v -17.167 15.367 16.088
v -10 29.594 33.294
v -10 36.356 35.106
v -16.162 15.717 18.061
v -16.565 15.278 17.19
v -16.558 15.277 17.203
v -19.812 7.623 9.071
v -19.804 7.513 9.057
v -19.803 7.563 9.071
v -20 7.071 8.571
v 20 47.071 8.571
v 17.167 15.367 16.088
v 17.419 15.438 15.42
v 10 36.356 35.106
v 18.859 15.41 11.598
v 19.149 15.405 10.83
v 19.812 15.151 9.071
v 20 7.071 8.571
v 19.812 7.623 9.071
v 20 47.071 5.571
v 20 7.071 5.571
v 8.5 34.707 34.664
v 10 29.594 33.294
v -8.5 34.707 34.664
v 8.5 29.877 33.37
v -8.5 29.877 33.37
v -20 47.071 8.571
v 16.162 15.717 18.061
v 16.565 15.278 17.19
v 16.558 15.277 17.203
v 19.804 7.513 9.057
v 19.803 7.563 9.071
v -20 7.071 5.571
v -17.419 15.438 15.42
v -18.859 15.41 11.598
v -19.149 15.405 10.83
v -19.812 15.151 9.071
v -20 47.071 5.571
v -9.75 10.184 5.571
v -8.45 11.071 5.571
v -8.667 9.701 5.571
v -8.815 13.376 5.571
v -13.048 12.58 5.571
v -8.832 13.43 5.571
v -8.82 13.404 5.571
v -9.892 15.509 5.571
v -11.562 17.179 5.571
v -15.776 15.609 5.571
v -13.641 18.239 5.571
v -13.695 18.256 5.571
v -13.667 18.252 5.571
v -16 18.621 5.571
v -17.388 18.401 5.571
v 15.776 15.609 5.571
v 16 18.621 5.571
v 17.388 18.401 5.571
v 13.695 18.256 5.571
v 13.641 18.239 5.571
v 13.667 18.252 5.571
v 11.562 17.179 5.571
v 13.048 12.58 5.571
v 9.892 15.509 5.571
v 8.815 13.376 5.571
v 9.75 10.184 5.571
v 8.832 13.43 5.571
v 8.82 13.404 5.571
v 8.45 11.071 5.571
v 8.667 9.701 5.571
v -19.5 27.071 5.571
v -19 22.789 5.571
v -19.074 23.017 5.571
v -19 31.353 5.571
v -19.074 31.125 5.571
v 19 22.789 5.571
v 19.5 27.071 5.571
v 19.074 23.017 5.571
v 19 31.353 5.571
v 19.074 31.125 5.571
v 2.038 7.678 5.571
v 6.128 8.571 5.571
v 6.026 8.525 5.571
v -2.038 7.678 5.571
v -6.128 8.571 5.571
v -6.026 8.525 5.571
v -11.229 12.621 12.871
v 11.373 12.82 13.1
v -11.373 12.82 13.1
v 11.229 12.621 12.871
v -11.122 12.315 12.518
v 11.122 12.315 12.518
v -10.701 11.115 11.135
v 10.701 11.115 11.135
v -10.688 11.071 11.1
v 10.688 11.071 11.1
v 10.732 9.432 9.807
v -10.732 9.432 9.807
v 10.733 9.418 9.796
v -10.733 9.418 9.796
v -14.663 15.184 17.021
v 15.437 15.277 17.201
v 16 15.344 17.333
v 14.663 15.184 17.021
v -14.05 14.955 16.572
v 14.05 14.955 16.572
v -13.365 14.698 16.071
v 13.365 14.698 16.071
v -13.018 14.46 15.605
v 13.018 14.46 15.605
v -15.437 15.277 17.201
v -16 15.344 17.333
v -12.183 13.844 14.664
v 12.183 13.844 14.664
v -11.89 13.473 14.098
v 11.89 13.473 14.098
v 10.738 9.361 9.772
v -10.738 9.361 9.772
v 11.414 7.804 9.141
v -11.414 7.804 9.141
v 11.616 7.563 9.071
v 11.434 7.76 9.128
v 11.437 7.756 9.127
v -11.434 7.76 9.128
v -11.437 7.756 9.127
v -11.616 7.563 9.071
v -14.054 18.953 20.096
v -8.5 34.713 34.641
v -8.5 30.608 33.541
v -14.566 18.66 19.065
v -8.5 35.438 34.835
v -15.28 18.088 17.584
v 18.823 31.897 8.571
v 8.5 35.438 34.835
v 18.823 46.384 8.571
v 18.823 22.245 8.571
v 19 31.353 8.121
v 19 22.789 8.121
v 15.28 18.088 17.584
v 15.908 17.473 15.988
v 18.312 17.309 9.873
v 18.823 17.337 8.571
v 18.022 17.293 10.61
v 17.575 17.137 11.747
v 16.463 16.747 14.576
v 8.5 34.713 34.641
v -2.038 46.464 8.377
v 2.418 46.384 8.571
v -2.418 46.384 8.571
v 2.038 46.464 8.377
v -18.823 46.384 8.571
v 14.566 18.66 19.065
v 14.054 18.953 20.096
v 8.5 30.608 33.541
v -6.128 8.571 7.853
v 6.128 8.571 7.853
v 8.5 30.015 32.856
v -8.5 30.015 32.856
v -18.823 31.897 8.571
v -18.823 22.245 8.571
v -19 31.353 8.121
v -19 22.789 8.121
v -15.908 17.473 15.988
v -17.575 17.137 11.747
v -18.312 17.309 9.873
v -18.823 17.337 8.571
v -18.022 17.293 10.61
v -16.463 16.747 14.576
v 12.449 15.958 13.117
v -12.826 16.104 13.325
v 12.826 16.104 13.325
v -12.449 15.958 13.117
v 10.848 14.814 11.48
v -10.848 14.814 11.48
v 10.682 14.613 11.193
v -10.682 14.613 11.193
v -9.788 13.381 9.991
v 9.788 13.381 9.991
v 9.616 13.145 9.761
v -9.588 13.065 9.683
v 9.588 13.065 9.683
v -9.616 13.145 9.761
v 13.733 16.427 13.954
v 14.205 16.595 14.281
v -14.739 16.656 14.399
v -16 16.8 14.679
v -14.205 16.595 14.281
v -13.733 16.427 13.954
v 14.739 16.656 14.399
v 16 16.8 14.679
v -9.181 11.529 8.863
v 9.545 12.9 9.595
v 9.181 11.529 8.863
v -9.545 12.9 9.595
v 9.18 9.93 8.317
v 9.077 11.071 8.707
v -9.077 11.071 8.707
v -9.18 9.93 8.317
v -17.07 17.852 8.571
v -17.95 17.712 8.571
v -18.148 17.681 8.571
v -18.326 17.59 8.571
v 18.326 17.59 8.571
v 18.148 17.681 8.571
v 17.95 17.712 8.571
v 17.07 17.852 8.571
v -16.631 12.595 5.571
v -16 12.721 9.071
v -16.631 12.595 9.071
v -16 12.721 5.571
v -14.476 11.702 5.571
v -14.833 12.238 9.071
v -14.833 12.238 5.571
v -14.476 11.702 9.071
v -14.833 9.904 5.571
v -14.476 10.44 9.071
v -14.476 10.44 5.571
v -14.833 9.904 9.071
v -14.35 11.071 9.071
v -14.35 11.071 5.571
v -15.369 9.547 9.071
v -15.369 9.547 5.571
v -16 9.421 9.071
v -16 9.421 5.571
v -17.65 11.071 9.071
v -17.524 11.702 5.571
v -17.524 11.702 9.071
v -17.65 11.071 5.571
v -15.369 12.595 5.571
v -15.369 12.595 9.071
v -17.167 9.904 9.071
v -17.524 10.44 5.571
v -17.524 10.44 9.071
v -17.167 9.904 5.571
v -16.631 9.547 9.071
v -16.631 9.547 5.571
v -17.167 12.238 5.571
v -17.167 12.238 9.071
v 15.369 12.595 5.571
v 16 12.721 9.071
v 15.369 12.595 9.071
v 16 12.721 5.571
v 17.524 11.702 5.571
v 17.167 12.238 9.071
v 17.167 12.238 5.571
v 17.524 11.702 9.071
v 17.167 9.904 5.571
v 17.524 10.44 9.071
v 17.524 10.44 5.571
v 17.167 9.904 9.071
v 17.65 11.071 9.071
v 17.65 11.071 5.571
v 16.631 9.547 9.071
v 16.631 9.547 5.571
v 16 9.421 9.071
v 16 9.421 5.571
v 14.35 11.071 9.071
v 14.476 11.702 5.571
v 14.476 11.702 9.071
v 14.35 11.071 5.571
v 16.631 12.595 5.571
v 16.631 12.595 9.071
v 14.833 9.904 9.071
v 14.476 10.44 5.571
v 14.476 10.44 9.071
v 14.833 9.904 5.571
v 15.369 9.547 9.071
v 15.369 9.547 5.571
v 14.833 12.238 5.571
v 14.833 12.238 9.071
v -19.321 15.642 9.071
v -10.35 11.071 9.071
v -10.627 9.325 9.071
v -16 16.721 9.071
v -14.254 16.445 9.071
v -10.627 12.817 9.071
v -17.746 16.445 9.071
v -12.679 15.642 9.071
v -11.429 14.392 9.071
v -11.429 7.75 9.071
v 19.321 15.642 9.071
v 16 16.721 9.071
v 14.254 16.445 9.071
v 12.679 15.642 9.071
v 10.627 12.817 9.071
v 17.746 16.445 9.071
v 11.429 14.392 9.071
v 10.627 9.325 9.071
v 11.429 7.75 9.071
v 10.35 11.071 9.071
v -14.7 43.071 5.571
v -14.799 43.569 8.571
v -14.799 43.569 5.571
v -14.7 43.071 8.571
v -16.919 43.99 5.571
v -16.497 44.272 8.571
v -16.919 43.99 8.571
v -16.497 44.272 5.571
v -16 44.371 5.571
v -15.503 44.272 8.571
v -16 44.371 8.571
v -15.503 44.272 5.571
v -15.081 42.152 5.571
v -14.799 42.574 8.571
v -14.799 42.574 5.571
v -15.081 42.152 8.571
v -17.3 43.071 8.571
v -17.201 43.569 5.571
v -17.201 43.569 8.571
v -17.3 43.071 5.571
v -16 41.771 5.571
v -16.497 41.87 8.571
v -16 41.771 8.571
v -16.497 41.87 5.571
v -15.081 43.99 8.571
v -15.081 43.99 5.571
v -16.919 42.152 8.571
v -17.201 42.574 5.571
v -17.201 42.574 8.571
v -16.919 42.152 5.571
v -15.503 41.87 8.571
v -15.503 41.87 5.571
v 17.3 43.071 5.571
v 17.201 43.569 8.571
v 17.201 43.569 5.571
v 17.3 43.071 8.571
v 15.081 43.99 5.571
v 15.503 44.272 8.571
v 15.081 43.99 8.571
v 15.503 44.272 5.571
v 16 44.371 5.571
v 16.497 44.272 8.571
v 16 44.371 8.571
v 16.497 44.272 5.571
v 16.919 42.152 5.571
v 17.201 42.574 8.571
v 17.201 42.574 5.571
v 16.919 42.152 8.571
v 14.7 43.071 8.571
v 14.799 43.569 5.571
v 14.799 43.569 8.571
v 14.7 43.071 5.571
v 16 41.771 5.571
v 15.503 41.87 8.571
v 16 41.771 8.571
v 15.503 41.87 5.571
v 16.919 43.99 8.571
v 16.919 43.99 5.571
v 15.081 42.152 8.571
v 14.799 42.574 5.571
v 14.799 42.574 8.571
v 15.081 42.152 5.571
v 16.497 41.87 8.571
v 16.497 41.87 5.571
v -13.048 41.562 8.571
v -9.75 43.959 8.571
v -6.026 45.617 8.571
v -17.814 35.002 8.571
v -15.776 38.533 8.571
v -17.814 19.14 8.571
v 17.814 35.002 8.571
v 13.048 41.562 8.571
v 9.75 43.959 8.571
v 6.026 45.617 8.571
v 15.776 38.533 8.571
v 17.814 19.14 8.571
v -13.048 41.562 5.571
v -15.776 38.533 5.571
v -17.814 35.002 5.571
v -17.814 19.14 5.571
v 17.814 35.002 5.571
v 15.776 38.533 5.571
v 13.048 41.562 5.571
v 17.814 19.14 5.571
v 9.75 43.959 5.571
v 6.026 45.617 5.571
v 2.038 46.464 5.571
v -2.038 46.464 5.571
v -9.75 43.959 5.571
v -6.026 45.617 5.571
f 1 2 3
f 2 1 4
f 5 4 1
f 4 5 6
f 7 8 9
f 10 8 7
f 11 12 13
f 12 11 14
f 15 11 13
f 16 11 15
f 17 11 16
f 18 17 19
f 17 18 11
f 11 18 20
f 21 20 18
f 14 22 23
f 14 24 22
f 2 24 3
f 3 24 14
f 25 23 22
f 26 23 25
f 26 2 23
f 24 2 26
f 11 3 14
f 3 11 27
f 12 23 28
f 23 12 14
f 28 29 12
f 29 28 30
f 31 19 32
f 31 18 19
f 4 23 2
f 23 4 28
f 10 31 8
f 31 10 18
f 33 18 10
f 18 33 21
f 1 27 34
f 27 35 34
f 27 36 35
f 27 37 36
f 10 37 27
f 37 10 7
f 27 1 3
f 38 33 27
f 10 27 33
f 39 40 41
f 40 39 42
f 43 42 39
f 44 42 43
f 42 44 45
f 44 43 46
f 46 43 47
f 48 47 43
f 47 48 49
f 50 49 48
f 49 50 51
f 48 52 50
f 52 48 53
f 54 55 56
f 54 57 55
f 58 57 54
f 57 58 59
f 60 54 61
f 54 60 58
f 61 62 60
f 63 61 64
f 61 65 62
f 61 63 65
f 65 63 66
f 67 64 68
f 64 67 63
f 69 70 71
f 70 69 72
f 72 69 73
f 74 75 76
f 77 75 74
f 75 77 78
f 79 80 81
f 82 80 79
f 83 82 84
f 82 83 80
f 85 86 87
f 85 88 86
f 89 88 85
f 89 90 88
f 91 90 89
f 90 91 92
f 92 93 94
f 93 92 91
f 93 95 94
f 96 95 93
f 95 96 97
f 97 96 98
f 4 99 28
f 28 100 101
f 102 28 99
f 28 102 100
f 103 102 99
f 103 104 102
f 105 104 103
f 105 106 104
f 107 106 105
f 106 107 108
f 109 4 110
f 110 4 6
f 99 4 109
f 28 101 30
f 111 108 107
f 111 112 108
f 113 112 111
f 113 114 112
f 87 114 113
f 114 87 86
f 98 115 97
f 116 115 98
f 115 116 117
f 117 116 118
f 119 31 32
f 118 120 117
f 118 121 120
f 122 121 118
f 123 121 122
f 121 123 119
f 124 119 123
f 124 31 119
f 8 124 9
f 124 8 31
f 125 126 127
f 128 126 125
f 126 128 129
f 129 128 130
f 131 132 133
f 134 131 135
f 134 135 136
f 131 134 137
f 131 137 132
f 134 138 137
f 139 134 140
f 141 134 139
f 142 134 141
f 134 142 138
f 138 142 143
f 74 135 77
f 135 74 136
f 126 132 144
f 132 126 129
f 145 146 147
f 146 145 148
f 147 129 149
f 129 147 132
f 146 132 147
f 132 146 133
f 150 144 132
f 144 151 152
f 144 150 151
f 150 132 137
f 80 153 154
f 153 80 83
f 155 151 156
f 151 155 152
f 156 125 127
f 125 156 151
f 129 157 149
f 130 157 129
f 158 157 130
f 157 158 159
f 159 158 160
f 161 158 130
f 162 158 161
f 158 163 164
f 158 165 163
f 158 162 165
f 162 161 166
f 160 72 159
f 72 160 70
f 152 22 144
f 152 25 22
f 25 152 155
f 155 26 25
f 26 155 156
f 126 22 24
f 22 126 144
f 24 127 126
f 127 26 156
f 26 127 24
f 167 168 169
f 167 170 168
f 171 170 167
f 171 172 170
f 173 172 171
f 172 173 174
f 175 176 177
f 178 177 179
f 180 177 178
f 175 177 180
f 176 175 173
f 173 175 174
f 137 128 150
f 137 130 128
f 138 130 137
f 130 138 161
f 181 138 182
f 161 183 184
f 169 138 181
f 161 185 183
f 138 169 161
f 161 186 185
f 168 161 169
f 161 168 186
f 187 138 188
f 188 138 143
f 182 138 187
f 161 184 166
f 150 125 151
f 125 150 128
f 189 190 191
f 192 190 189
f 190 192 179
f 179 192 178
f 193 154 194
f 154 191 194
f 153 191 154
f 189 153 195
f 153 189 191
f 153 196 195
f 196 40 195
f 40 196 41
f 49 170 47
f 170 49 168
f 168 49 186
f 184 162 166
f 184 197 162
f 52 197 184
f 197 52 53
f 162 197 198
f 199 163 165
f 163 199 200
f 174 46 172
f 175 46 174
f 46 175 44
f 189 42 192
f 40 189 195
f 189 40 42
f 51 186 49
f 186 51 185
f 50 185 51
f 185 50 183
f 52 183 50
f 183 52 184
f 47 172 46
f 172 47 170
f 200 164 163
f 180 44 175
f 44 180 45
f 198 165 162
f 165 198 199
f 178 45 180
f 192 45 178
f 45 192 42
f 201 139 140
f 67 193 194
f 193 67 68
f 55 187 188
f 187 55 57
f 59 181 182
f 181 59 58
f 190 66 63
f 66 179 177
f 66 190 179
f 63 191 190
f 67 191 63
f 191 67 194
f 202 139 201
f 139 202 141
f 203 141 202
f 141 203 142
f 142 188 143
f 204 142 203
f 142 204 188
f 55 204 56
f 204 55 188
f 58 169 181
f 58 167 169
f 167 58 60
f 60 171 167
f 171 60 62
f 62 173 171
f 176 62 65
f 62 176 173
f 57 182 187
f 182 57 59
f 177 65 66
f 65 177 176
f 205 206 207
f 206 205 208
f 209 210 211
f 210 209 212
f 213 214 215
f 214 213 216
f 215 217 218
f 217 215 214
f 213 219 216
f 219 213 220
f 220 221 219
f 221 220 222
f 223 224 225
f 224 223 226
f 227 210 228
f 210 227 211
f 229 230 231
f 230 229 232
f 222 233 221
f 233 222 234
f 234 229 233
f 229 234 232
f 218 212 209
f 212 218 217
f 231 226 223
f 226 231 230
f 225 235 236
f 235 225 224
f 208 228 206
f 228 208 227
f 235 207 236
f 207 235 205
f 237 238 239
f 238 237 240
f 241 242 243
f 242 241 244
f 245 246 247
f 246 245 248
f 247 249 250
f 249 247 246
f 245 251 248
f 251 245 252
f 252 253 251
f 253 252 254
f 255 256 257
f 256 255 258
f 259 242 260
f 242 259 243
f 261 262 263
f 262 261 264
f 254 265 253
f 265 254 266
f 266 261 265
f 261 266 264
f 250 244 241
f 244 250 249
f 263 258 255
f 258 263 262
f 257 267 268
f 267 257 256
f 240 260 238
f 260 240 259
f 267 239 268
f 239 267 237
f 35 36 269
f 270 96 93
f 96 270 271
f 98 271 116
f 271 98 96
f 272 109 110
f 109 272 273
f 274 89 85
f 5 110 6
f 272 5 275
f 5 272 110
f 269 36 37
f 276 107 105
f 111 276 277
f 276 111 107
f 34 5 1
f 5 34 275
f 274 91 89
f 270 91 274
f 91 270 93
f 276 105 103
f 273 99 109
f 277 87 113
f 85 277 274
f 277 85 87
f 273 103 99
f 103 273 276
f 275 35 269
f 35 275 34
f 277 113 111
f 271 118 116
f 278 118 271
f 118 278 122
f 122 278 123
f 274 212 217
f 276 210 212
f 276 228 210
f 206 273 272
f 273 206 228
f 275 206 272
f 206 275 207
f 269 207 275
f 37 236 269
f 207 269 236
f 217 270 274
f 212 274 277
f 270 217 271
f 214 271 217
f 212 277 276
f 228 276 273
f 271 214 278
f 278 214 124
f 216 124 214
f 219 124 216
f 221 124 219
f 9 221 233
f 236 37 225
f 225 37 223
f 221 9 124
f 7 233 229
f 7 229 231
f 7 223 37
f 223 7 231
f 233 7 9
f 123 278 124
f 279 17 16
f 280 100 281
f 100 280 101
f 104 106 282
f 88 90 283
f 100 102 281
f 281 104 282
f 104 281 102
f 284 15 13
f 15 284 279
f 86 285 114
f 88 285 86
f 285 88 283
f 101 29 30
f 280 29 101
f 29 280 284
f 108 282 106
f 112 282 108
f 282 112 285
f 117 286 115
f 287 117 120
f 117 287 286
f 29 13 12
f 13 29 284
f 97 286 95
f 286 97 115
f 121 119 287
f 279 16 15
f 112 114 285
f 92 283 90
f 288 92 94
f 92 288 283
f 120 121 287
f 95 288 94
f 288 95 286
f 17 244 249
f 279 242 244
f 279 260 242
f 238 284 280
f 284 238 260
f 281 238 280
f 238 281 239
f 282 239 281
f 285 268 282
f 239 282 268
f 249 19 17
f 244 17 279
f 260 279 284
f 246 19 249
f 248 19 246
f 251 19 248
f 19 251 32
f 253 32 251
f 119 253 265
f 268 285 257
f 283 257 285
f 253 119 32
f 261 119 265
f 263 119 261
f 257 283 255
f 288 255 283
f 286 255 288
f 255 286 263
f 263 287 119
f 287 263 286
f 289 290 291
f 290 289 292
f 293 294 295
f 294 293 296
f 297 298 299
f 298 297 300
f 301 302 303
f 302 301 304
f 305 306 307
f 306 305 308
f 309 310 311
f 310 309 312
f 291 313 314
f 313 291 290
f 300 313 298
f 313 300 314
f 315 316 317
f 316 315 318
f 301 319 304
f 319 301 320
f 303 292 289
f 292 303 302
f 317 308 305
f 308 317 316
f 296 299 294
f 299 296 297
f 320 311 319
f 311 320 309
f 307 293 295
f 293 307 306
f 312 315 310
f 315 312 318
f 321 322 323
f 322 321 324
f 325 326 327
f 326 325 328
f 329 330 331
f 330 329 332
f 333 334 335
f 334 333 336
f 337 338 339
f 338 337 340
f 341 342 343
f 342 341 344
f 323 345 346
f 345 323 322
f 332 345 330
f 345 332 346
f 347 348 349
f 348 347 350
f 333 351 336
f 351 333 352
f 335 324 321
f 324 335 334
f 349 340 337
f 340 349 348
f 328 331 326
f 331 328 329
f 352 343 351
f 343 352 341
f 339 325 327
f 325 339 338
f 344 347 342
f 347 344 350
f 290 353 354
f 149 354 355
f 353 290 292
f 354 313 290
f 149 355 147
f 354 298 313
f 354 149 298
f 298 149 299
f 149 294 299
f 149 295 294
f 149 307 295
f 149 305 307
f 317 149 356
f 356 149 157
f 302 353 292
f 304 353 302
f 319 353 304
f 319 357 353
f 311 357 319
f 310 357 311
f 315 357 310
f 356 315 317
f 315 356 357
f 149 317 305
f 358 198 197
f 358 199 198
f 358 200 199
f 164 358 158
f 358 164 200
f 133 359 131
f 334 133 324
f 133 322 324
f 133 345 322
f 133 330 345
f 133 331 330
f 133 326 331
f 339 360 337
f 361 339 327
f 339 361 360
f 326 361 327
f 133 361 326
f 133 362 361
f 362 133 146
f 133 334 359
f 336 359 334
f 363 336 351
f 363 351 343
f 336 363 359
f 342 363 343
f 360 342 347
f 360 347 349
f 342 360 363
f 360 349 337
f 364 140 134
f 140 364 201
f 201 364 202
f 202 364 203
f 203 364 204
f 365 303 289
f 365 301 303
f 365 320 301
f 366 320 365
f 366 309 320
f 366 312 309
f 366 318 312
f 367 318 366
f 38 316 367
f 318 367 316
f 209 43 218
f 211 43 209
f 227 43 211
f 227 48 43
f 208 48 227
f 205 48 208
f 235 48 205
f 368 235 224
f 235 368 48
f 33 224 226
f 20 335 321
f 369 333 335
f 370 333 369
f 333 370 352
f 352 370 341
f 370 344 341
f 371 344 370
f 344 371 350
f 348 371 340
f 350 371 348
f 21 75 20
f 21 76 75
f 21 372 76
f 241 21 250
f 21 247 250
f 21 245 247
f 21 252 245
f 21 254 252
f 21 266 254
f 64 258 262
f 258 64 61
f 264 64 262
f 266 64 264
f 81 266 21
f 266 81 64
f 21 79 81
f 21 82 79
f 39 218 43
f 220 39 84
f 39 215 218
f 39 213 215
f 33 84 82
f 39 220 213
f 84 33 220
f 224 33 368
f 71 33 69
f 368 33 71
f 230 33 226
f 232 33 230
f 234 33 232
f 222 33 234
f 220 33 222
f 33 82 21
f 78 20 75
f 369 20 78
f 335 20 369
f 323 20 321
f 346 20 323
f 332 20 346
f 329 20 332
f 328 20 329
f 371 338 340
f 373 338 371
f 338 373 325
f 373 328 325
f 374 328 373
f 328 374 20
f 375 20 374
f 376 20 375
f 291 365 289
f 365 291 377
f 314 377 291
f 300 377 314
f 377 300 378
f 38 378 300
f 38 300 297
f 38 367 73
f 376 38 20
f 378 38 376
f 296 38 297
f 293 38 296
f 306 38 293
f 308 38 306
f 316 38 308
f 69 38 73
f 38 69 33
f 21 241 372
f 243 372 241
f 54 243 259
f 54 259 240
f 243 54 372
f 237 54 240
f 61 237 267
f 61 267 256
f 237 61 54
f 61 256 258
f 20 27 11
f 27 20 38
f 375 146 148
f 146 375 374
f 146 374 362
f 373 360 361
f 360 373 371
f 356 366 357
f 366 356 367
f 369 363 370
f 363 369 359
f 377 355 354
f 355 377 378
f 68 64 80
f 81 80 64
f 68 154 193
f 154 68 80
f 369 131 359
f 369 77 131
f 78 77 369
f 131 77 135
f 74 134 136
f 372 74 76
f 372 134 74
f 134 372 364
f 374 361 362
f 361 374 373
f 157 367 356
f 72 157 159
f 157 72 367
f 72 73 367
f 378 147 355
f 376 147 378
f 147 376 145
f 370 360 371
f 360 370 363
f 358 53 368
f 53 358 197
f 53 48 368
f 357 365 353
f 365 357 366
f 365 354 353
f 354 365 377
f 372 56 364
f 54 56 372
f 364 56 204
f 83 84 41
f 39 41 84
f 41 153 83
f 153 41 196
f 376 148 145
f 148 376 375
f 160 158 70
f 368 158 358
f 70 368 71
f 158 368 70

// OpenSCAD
t=2;
m3r=3.3/2;
fan_rot=-45;
duct_rot=-30;
fan_w=40;
fan_r=fan_w/2;
fan_mount_t=3;
fan_t=10;
fan_off_x=0;
fan_off_y=(fan_w/2)*sin(fan_rot);
fan_off_z=-(fan_w/2)*cos(fan_rot)-fan_t;
duct_out_h=7;
duct_out_w=20;
duct_out_off_x=0;
duct_out_off_y=0;
duct_out_off_z=-47;
duct_cut_r=17;
duct_cut_off_x=0;
duct_cut_off_y=10;
duct_cut_off_z=-26;
duct_cut_rot=28;
duct_cut_scale=0.4;

//chimera info
hs_height=30;
side_mh1_Y=-4.5;
side_mh1_Z=5;
side_mh2_Y=0;
side_mh2_Z=-5;
side_mh3_Y=4.5;
side_mh3_Z=5;
fan_bracket_thickness=4;
fan_bracket_spacer=1;
fan_mount_h_offset=35;
fan_mount_hole_r=3.3/2;
c_fan_z_offset=-(fan_r*2-hs_height)/2-1;
min_fan_bracket_meat=fan_bracket_thickness+0.1;
m3_sc_height=3; //m3 socket cap height
m3_sc_r=7/3;
hs_mh_r=3.3/2;
fan_bracket_offset=20;


module fanMount() {
		difference() {
            cube([fan_w,fan_w,fan_mount_t], center=true);
            cylinder(r=19.5,h=fan_mount_t+0.2,center=true);
                    //fan mounting holes
            //clearance holes
            for(x=[-1,1])
                translate([x*16,-16,0]) cylinder(r=m3r,h=20,$fn=16,center=true);
            //tappable holes
            for(x=[-1,1])
                translate([x*16,16,0]) cylinder(r=2.6/2,h=10,$fn=16,center=true);
		}
}

module duct(){
    difference(){
        union(){
            difference(){
             //outside duct shape 
                difference(){
                    hull(){
                    translate([fan_off_x,fan_off_y,fan_off_z])
                        rotate([fan_rot,0,0])
                            cube([fan_w,fan_mount_t,fan_w],center=true);
                    translate([duct_out_off_x,duct_out_off_y,duct_out_off_z])
                        rotate([duct_rot,0,0])
                            cube([duct_out_w,t,duct_out_h],center=true);      
                    }
                    hull(){
                     translate([duct_cut_off_x,duct_cut_off_y+3,duct_cut_off_z+2])
                        rotate([duct_cut_rot,0,0])
                            rotate([0,90,0])
                                cube([duct_cut_r*2+5,0.1,fan_w+2],center=true);         
                     translate([duct_cut_off_x,duct_cut_off_y,duct_cut_off_z])rotate([duct_cut_rot,0,0])
                            scale([1,duct_cut_scale,1])rotate([0,90,0])
                            cylinder(r=duct_cut_r,h=fan_w+2,$fn=30,center=true);
                    }
                }
                //Inside cutout of the duct
                difference(){
                    union(){
                        hull(){
                            translate([fan_off_x,fan_off_y+(t/2)*sin(fan_rot),fan_off_z])
                                rotate([fan_rot,0,0])
                                    cube([fan_w-t,fan_mount_t+0.1,fan_w-t],center=true);
                            translate([duct_out_off_x,duct_out_off_y-(t)*sin(fan_rot)-1.5,duct_out_off_z])
                                rotate([duct_rot,0,0])
                                    cube([duct_out_w-t*1.5,t+0.1,duct_out_h-t],center=true);      
                        }
                        translate([duct_out_off_x,duct_out_off_y-(t)*sin(fan_rot),duct_out_off_z])
                            rotate([duct_rot,0,0])
                                cube([duct_out_w-t*1.5,t+0.1,duct_out_h-t],center=true);
                    }
                    hull(){
                     translate([duct_cut_off_x,duct_cut_off_y+(t)*sin(fan_rot)+3,duct_cut_off_z+2-(t)*cos(fan_rot)])
                        rotate([duct_cut_rot+6,0,0])
                            rotate([0,90,0])
                                cube([duct_cut_r*2+5,0.1,fan_w+2],center=true);         
                     translate([duct_cut_off_x,duct_cut_off_y+(t)*sin(fan_rot),duct_cut_off_z-(t)*cos(fan_rot)])
                        rotate([duct_cut_rot+6,0,0])
                            scale([1,duct_cut_scale,1])rotate([0,90,0])
                                cylinder(r=duct_cut_r,h=fan_w+2,$fn=30,center=true);
                    }
                            
                }
            }
            //fan mounting lugs
            //outside duct shape
            intersection(){ 
                difference(){
                    hull(){
                    translate([fan_off_x,fan_off_y,fan_off_z])
                        rotate([fan_rot,0,0])
                            cube([fan_w,fan_mount_t,fan_w],center=true);
                    translate([duct_out_off_x,duct_out_off_y,duct_out_off_z])
                        rotate([duct_rot,0,0])
                            cube([duct_out_w,t,duct_out_h],center=true);      
                    }
                    hull(){
                     translate([duct_cut_off_x,duct_cut_off_y+3,duct_cut_off_z+2])
                        rotate([duct_cut_rot,0,0])
                            rotate([0,90,0])
                                cube([duct_cut_r*2+5,0.1,fan_w+2],center=true);         
                     translate([duct_cut_off_x,duct_cut_off_y,duct_cut_off_z])rotate([duct_cut_rot,0,0])
                            scale([1,duct_cut_scale,1])rotate([0,90,0])
                            cylinder(r=duct_cut_r,h=fan_w+2,$fn=30,center=true);
                    }
                }
                translate([fan_off_x,fan_off_y,fan_off_z]) rotate([-fan_rot,0,0])
                    for(x=[-1,1])
                        for(y=[1]) //for(y=[-1,1])
                            translate([x*16,y*16,-8])
                               cylinder(r2=(m3r+t)+4,r1=(m3r+t),h=20,$fn=20,center=true);
            }
        }
        //fan mounting holes
        translate([fan_off_x,fan_off_y,fan_off_z]) rotate([-fan_rot,0,0]){
            //clearance holes
            for(x=[-1,1])
                translate([x*16,16,0]) cylinder(r=m3r,h=20,$fn=16,center=true);
            //tappable holes
            for(x=[-1,1])
                translate([x*16,-16,0]) cylinder(r=2.6/2,h=10,$fn=16,center=true);
        }
        //fan mounting lug cutouts
        translate([fan_off_x,fan_off_y,fan_off_z]) rotate([-fan_rot,0,0])
        for(x=[-1,1])
            for(y=[1]) //for(y=[-1,1])
               translate([x*16,y*16,-8]) cylinder(r2=(m3r+t)+2,r1=(m3r+t),h=12,$fn=20,center=true);
    }
    translate([fan_off_x,fan_off_y,fan_off_z])
        rotate([-90+fan_rot,0,0])
           fanMount();
}

module c_fan_bracket(){
    difference(){
        union(){
            hull(){
                translate([0,side_mh1_Y,side_mh1_Z]) rotate([0,90,0])
                    cylinder(r=hs_mh_r+2, h=fan_bracket_thickness, $fn=50,center=true);
                translate([0,side_mh2_Y,side_mh2_Z]) rotate([0,90,0])
                    cylinder(r=hs_mh_r+2, h=fan_bracket_thickness, $fn=50,center=true);
                translate([0,side_mh3_Y,side_mh3_Z]) rotate([0,90,0])
                    cylinder(r=hs_mh_r+2, h=fan_bracket_thickness, $fn=50,center=true);
            
            //fan mount width
            translate([0,0,c_fan_z_offset])
            for(i=[1,-1])
                translate([0,i*fan_mount_h_offset/2,fan_mount_h_offset/2]) rotate([0,90,0])
                    cylinder(h=fan_bracket_thickness,r=fan_mount_hole_r+1,center=true,$fn=120);
            }

                //fan mount width
                
            for(x=[1,-1]){
                hull(){
                    translate([0,-x*2,c_fan_z_offset-2])
                        translate([0,x*fan_mount_h_offset/2,fan_mount_h_offset/2+2]) rotate([0,90,0])
                            scale([0.5,1,1])
                                cylinder(h=fan_bracket_thickness,r=fan_mount_hole_r+3,center=true,$fn=120);
                //undo the bracket rotation/translation
                translate([-(fan_bracket_offset+fan_bracket_thickness/2),0,hs_height/2])
                    rotate([0,0,-90])
                        translate([fan_off_x,fan_off_y,fan_off_z]) rotate([-fan_rot,0,0])
                                translate([-x*16,19.5,-6.5])
                               cylinder(r=(m3r+t)+1,h=fan_mount_t,$fn=20,center=true);
                }
              }
        }
        //mounting holes
        translate([0,side_mh1_Y,side_mh1_Z]){ rotate([0,90,0])
            cylinder(r=hs_mh_r, h=40, $fn=5,center=true);
        translate([fan_bracket_thickness/2-20/2-min_fan_bracket_meat,0,0])
                rotate([0,90,0])
                    cylinder(r=m3_sc_r, h=20, $fn=20,center=true);
        }
        translate([0,side_mh2_Y,side_mh2_Z]){ rotate([0,90,0])
            cylinder(r=hs_mh_r, h=20, $fn=5,center=true);
        translate([fan_bracket_thickness/2-10/2-min_fan_bracket_meat,0,0])
            rotate([0,90,0])
                cylinder(r=m3_sc_r, h=10, $fn=20,center=true);
        }
        translate([0,side_mh3_Y,side_mh3_Z]){ rotate([0,90,0])
            cylinder(r=hs_mh_r, h=40, $fn=5,center=true);
            translate([fan_bracket_thickness/2-20/2-min_fan_bracket_meat,0,0])
                rotate([0,90,0])
                    cylinder(r=m3_sc_r, h=20, $fn=20,center=true);
            }

         
        
        //fan mounting holes
        //undo the bracket rotation/translation
        translate([-(fan_bracket_offset+fan_bracket_thickness/2),0,hs_height/2])
            rotate([0,0,-90])
                translate([fan_off_x,fan_off_y,fan_off_z]) rotate([-fan_rot,0,0])
                    for(x=[-1,1])
                    translate([x*16,19.5,0]) cylinder(r=m3r,h=20,$fn=16,center=true);    
            
    }
}

if(1) stl();
else assembly();

module assembly(){
   // translate([0,fan_bracket_offset-fan_bracket_thickness/2,-hs_height/2])
     //   rotate([0,0,90])
      //      c_fan_bracket();

    duct();
}
    

module stl(){
   // translate([0,fan_bracket_offset-fan_bracket_thickness/2,-hs_height/2])
    //    rotate([0,90,90])
    //        c_fan_bracket();

        
    rotate([-fan_rot+90,0,0])
    duct();
}
